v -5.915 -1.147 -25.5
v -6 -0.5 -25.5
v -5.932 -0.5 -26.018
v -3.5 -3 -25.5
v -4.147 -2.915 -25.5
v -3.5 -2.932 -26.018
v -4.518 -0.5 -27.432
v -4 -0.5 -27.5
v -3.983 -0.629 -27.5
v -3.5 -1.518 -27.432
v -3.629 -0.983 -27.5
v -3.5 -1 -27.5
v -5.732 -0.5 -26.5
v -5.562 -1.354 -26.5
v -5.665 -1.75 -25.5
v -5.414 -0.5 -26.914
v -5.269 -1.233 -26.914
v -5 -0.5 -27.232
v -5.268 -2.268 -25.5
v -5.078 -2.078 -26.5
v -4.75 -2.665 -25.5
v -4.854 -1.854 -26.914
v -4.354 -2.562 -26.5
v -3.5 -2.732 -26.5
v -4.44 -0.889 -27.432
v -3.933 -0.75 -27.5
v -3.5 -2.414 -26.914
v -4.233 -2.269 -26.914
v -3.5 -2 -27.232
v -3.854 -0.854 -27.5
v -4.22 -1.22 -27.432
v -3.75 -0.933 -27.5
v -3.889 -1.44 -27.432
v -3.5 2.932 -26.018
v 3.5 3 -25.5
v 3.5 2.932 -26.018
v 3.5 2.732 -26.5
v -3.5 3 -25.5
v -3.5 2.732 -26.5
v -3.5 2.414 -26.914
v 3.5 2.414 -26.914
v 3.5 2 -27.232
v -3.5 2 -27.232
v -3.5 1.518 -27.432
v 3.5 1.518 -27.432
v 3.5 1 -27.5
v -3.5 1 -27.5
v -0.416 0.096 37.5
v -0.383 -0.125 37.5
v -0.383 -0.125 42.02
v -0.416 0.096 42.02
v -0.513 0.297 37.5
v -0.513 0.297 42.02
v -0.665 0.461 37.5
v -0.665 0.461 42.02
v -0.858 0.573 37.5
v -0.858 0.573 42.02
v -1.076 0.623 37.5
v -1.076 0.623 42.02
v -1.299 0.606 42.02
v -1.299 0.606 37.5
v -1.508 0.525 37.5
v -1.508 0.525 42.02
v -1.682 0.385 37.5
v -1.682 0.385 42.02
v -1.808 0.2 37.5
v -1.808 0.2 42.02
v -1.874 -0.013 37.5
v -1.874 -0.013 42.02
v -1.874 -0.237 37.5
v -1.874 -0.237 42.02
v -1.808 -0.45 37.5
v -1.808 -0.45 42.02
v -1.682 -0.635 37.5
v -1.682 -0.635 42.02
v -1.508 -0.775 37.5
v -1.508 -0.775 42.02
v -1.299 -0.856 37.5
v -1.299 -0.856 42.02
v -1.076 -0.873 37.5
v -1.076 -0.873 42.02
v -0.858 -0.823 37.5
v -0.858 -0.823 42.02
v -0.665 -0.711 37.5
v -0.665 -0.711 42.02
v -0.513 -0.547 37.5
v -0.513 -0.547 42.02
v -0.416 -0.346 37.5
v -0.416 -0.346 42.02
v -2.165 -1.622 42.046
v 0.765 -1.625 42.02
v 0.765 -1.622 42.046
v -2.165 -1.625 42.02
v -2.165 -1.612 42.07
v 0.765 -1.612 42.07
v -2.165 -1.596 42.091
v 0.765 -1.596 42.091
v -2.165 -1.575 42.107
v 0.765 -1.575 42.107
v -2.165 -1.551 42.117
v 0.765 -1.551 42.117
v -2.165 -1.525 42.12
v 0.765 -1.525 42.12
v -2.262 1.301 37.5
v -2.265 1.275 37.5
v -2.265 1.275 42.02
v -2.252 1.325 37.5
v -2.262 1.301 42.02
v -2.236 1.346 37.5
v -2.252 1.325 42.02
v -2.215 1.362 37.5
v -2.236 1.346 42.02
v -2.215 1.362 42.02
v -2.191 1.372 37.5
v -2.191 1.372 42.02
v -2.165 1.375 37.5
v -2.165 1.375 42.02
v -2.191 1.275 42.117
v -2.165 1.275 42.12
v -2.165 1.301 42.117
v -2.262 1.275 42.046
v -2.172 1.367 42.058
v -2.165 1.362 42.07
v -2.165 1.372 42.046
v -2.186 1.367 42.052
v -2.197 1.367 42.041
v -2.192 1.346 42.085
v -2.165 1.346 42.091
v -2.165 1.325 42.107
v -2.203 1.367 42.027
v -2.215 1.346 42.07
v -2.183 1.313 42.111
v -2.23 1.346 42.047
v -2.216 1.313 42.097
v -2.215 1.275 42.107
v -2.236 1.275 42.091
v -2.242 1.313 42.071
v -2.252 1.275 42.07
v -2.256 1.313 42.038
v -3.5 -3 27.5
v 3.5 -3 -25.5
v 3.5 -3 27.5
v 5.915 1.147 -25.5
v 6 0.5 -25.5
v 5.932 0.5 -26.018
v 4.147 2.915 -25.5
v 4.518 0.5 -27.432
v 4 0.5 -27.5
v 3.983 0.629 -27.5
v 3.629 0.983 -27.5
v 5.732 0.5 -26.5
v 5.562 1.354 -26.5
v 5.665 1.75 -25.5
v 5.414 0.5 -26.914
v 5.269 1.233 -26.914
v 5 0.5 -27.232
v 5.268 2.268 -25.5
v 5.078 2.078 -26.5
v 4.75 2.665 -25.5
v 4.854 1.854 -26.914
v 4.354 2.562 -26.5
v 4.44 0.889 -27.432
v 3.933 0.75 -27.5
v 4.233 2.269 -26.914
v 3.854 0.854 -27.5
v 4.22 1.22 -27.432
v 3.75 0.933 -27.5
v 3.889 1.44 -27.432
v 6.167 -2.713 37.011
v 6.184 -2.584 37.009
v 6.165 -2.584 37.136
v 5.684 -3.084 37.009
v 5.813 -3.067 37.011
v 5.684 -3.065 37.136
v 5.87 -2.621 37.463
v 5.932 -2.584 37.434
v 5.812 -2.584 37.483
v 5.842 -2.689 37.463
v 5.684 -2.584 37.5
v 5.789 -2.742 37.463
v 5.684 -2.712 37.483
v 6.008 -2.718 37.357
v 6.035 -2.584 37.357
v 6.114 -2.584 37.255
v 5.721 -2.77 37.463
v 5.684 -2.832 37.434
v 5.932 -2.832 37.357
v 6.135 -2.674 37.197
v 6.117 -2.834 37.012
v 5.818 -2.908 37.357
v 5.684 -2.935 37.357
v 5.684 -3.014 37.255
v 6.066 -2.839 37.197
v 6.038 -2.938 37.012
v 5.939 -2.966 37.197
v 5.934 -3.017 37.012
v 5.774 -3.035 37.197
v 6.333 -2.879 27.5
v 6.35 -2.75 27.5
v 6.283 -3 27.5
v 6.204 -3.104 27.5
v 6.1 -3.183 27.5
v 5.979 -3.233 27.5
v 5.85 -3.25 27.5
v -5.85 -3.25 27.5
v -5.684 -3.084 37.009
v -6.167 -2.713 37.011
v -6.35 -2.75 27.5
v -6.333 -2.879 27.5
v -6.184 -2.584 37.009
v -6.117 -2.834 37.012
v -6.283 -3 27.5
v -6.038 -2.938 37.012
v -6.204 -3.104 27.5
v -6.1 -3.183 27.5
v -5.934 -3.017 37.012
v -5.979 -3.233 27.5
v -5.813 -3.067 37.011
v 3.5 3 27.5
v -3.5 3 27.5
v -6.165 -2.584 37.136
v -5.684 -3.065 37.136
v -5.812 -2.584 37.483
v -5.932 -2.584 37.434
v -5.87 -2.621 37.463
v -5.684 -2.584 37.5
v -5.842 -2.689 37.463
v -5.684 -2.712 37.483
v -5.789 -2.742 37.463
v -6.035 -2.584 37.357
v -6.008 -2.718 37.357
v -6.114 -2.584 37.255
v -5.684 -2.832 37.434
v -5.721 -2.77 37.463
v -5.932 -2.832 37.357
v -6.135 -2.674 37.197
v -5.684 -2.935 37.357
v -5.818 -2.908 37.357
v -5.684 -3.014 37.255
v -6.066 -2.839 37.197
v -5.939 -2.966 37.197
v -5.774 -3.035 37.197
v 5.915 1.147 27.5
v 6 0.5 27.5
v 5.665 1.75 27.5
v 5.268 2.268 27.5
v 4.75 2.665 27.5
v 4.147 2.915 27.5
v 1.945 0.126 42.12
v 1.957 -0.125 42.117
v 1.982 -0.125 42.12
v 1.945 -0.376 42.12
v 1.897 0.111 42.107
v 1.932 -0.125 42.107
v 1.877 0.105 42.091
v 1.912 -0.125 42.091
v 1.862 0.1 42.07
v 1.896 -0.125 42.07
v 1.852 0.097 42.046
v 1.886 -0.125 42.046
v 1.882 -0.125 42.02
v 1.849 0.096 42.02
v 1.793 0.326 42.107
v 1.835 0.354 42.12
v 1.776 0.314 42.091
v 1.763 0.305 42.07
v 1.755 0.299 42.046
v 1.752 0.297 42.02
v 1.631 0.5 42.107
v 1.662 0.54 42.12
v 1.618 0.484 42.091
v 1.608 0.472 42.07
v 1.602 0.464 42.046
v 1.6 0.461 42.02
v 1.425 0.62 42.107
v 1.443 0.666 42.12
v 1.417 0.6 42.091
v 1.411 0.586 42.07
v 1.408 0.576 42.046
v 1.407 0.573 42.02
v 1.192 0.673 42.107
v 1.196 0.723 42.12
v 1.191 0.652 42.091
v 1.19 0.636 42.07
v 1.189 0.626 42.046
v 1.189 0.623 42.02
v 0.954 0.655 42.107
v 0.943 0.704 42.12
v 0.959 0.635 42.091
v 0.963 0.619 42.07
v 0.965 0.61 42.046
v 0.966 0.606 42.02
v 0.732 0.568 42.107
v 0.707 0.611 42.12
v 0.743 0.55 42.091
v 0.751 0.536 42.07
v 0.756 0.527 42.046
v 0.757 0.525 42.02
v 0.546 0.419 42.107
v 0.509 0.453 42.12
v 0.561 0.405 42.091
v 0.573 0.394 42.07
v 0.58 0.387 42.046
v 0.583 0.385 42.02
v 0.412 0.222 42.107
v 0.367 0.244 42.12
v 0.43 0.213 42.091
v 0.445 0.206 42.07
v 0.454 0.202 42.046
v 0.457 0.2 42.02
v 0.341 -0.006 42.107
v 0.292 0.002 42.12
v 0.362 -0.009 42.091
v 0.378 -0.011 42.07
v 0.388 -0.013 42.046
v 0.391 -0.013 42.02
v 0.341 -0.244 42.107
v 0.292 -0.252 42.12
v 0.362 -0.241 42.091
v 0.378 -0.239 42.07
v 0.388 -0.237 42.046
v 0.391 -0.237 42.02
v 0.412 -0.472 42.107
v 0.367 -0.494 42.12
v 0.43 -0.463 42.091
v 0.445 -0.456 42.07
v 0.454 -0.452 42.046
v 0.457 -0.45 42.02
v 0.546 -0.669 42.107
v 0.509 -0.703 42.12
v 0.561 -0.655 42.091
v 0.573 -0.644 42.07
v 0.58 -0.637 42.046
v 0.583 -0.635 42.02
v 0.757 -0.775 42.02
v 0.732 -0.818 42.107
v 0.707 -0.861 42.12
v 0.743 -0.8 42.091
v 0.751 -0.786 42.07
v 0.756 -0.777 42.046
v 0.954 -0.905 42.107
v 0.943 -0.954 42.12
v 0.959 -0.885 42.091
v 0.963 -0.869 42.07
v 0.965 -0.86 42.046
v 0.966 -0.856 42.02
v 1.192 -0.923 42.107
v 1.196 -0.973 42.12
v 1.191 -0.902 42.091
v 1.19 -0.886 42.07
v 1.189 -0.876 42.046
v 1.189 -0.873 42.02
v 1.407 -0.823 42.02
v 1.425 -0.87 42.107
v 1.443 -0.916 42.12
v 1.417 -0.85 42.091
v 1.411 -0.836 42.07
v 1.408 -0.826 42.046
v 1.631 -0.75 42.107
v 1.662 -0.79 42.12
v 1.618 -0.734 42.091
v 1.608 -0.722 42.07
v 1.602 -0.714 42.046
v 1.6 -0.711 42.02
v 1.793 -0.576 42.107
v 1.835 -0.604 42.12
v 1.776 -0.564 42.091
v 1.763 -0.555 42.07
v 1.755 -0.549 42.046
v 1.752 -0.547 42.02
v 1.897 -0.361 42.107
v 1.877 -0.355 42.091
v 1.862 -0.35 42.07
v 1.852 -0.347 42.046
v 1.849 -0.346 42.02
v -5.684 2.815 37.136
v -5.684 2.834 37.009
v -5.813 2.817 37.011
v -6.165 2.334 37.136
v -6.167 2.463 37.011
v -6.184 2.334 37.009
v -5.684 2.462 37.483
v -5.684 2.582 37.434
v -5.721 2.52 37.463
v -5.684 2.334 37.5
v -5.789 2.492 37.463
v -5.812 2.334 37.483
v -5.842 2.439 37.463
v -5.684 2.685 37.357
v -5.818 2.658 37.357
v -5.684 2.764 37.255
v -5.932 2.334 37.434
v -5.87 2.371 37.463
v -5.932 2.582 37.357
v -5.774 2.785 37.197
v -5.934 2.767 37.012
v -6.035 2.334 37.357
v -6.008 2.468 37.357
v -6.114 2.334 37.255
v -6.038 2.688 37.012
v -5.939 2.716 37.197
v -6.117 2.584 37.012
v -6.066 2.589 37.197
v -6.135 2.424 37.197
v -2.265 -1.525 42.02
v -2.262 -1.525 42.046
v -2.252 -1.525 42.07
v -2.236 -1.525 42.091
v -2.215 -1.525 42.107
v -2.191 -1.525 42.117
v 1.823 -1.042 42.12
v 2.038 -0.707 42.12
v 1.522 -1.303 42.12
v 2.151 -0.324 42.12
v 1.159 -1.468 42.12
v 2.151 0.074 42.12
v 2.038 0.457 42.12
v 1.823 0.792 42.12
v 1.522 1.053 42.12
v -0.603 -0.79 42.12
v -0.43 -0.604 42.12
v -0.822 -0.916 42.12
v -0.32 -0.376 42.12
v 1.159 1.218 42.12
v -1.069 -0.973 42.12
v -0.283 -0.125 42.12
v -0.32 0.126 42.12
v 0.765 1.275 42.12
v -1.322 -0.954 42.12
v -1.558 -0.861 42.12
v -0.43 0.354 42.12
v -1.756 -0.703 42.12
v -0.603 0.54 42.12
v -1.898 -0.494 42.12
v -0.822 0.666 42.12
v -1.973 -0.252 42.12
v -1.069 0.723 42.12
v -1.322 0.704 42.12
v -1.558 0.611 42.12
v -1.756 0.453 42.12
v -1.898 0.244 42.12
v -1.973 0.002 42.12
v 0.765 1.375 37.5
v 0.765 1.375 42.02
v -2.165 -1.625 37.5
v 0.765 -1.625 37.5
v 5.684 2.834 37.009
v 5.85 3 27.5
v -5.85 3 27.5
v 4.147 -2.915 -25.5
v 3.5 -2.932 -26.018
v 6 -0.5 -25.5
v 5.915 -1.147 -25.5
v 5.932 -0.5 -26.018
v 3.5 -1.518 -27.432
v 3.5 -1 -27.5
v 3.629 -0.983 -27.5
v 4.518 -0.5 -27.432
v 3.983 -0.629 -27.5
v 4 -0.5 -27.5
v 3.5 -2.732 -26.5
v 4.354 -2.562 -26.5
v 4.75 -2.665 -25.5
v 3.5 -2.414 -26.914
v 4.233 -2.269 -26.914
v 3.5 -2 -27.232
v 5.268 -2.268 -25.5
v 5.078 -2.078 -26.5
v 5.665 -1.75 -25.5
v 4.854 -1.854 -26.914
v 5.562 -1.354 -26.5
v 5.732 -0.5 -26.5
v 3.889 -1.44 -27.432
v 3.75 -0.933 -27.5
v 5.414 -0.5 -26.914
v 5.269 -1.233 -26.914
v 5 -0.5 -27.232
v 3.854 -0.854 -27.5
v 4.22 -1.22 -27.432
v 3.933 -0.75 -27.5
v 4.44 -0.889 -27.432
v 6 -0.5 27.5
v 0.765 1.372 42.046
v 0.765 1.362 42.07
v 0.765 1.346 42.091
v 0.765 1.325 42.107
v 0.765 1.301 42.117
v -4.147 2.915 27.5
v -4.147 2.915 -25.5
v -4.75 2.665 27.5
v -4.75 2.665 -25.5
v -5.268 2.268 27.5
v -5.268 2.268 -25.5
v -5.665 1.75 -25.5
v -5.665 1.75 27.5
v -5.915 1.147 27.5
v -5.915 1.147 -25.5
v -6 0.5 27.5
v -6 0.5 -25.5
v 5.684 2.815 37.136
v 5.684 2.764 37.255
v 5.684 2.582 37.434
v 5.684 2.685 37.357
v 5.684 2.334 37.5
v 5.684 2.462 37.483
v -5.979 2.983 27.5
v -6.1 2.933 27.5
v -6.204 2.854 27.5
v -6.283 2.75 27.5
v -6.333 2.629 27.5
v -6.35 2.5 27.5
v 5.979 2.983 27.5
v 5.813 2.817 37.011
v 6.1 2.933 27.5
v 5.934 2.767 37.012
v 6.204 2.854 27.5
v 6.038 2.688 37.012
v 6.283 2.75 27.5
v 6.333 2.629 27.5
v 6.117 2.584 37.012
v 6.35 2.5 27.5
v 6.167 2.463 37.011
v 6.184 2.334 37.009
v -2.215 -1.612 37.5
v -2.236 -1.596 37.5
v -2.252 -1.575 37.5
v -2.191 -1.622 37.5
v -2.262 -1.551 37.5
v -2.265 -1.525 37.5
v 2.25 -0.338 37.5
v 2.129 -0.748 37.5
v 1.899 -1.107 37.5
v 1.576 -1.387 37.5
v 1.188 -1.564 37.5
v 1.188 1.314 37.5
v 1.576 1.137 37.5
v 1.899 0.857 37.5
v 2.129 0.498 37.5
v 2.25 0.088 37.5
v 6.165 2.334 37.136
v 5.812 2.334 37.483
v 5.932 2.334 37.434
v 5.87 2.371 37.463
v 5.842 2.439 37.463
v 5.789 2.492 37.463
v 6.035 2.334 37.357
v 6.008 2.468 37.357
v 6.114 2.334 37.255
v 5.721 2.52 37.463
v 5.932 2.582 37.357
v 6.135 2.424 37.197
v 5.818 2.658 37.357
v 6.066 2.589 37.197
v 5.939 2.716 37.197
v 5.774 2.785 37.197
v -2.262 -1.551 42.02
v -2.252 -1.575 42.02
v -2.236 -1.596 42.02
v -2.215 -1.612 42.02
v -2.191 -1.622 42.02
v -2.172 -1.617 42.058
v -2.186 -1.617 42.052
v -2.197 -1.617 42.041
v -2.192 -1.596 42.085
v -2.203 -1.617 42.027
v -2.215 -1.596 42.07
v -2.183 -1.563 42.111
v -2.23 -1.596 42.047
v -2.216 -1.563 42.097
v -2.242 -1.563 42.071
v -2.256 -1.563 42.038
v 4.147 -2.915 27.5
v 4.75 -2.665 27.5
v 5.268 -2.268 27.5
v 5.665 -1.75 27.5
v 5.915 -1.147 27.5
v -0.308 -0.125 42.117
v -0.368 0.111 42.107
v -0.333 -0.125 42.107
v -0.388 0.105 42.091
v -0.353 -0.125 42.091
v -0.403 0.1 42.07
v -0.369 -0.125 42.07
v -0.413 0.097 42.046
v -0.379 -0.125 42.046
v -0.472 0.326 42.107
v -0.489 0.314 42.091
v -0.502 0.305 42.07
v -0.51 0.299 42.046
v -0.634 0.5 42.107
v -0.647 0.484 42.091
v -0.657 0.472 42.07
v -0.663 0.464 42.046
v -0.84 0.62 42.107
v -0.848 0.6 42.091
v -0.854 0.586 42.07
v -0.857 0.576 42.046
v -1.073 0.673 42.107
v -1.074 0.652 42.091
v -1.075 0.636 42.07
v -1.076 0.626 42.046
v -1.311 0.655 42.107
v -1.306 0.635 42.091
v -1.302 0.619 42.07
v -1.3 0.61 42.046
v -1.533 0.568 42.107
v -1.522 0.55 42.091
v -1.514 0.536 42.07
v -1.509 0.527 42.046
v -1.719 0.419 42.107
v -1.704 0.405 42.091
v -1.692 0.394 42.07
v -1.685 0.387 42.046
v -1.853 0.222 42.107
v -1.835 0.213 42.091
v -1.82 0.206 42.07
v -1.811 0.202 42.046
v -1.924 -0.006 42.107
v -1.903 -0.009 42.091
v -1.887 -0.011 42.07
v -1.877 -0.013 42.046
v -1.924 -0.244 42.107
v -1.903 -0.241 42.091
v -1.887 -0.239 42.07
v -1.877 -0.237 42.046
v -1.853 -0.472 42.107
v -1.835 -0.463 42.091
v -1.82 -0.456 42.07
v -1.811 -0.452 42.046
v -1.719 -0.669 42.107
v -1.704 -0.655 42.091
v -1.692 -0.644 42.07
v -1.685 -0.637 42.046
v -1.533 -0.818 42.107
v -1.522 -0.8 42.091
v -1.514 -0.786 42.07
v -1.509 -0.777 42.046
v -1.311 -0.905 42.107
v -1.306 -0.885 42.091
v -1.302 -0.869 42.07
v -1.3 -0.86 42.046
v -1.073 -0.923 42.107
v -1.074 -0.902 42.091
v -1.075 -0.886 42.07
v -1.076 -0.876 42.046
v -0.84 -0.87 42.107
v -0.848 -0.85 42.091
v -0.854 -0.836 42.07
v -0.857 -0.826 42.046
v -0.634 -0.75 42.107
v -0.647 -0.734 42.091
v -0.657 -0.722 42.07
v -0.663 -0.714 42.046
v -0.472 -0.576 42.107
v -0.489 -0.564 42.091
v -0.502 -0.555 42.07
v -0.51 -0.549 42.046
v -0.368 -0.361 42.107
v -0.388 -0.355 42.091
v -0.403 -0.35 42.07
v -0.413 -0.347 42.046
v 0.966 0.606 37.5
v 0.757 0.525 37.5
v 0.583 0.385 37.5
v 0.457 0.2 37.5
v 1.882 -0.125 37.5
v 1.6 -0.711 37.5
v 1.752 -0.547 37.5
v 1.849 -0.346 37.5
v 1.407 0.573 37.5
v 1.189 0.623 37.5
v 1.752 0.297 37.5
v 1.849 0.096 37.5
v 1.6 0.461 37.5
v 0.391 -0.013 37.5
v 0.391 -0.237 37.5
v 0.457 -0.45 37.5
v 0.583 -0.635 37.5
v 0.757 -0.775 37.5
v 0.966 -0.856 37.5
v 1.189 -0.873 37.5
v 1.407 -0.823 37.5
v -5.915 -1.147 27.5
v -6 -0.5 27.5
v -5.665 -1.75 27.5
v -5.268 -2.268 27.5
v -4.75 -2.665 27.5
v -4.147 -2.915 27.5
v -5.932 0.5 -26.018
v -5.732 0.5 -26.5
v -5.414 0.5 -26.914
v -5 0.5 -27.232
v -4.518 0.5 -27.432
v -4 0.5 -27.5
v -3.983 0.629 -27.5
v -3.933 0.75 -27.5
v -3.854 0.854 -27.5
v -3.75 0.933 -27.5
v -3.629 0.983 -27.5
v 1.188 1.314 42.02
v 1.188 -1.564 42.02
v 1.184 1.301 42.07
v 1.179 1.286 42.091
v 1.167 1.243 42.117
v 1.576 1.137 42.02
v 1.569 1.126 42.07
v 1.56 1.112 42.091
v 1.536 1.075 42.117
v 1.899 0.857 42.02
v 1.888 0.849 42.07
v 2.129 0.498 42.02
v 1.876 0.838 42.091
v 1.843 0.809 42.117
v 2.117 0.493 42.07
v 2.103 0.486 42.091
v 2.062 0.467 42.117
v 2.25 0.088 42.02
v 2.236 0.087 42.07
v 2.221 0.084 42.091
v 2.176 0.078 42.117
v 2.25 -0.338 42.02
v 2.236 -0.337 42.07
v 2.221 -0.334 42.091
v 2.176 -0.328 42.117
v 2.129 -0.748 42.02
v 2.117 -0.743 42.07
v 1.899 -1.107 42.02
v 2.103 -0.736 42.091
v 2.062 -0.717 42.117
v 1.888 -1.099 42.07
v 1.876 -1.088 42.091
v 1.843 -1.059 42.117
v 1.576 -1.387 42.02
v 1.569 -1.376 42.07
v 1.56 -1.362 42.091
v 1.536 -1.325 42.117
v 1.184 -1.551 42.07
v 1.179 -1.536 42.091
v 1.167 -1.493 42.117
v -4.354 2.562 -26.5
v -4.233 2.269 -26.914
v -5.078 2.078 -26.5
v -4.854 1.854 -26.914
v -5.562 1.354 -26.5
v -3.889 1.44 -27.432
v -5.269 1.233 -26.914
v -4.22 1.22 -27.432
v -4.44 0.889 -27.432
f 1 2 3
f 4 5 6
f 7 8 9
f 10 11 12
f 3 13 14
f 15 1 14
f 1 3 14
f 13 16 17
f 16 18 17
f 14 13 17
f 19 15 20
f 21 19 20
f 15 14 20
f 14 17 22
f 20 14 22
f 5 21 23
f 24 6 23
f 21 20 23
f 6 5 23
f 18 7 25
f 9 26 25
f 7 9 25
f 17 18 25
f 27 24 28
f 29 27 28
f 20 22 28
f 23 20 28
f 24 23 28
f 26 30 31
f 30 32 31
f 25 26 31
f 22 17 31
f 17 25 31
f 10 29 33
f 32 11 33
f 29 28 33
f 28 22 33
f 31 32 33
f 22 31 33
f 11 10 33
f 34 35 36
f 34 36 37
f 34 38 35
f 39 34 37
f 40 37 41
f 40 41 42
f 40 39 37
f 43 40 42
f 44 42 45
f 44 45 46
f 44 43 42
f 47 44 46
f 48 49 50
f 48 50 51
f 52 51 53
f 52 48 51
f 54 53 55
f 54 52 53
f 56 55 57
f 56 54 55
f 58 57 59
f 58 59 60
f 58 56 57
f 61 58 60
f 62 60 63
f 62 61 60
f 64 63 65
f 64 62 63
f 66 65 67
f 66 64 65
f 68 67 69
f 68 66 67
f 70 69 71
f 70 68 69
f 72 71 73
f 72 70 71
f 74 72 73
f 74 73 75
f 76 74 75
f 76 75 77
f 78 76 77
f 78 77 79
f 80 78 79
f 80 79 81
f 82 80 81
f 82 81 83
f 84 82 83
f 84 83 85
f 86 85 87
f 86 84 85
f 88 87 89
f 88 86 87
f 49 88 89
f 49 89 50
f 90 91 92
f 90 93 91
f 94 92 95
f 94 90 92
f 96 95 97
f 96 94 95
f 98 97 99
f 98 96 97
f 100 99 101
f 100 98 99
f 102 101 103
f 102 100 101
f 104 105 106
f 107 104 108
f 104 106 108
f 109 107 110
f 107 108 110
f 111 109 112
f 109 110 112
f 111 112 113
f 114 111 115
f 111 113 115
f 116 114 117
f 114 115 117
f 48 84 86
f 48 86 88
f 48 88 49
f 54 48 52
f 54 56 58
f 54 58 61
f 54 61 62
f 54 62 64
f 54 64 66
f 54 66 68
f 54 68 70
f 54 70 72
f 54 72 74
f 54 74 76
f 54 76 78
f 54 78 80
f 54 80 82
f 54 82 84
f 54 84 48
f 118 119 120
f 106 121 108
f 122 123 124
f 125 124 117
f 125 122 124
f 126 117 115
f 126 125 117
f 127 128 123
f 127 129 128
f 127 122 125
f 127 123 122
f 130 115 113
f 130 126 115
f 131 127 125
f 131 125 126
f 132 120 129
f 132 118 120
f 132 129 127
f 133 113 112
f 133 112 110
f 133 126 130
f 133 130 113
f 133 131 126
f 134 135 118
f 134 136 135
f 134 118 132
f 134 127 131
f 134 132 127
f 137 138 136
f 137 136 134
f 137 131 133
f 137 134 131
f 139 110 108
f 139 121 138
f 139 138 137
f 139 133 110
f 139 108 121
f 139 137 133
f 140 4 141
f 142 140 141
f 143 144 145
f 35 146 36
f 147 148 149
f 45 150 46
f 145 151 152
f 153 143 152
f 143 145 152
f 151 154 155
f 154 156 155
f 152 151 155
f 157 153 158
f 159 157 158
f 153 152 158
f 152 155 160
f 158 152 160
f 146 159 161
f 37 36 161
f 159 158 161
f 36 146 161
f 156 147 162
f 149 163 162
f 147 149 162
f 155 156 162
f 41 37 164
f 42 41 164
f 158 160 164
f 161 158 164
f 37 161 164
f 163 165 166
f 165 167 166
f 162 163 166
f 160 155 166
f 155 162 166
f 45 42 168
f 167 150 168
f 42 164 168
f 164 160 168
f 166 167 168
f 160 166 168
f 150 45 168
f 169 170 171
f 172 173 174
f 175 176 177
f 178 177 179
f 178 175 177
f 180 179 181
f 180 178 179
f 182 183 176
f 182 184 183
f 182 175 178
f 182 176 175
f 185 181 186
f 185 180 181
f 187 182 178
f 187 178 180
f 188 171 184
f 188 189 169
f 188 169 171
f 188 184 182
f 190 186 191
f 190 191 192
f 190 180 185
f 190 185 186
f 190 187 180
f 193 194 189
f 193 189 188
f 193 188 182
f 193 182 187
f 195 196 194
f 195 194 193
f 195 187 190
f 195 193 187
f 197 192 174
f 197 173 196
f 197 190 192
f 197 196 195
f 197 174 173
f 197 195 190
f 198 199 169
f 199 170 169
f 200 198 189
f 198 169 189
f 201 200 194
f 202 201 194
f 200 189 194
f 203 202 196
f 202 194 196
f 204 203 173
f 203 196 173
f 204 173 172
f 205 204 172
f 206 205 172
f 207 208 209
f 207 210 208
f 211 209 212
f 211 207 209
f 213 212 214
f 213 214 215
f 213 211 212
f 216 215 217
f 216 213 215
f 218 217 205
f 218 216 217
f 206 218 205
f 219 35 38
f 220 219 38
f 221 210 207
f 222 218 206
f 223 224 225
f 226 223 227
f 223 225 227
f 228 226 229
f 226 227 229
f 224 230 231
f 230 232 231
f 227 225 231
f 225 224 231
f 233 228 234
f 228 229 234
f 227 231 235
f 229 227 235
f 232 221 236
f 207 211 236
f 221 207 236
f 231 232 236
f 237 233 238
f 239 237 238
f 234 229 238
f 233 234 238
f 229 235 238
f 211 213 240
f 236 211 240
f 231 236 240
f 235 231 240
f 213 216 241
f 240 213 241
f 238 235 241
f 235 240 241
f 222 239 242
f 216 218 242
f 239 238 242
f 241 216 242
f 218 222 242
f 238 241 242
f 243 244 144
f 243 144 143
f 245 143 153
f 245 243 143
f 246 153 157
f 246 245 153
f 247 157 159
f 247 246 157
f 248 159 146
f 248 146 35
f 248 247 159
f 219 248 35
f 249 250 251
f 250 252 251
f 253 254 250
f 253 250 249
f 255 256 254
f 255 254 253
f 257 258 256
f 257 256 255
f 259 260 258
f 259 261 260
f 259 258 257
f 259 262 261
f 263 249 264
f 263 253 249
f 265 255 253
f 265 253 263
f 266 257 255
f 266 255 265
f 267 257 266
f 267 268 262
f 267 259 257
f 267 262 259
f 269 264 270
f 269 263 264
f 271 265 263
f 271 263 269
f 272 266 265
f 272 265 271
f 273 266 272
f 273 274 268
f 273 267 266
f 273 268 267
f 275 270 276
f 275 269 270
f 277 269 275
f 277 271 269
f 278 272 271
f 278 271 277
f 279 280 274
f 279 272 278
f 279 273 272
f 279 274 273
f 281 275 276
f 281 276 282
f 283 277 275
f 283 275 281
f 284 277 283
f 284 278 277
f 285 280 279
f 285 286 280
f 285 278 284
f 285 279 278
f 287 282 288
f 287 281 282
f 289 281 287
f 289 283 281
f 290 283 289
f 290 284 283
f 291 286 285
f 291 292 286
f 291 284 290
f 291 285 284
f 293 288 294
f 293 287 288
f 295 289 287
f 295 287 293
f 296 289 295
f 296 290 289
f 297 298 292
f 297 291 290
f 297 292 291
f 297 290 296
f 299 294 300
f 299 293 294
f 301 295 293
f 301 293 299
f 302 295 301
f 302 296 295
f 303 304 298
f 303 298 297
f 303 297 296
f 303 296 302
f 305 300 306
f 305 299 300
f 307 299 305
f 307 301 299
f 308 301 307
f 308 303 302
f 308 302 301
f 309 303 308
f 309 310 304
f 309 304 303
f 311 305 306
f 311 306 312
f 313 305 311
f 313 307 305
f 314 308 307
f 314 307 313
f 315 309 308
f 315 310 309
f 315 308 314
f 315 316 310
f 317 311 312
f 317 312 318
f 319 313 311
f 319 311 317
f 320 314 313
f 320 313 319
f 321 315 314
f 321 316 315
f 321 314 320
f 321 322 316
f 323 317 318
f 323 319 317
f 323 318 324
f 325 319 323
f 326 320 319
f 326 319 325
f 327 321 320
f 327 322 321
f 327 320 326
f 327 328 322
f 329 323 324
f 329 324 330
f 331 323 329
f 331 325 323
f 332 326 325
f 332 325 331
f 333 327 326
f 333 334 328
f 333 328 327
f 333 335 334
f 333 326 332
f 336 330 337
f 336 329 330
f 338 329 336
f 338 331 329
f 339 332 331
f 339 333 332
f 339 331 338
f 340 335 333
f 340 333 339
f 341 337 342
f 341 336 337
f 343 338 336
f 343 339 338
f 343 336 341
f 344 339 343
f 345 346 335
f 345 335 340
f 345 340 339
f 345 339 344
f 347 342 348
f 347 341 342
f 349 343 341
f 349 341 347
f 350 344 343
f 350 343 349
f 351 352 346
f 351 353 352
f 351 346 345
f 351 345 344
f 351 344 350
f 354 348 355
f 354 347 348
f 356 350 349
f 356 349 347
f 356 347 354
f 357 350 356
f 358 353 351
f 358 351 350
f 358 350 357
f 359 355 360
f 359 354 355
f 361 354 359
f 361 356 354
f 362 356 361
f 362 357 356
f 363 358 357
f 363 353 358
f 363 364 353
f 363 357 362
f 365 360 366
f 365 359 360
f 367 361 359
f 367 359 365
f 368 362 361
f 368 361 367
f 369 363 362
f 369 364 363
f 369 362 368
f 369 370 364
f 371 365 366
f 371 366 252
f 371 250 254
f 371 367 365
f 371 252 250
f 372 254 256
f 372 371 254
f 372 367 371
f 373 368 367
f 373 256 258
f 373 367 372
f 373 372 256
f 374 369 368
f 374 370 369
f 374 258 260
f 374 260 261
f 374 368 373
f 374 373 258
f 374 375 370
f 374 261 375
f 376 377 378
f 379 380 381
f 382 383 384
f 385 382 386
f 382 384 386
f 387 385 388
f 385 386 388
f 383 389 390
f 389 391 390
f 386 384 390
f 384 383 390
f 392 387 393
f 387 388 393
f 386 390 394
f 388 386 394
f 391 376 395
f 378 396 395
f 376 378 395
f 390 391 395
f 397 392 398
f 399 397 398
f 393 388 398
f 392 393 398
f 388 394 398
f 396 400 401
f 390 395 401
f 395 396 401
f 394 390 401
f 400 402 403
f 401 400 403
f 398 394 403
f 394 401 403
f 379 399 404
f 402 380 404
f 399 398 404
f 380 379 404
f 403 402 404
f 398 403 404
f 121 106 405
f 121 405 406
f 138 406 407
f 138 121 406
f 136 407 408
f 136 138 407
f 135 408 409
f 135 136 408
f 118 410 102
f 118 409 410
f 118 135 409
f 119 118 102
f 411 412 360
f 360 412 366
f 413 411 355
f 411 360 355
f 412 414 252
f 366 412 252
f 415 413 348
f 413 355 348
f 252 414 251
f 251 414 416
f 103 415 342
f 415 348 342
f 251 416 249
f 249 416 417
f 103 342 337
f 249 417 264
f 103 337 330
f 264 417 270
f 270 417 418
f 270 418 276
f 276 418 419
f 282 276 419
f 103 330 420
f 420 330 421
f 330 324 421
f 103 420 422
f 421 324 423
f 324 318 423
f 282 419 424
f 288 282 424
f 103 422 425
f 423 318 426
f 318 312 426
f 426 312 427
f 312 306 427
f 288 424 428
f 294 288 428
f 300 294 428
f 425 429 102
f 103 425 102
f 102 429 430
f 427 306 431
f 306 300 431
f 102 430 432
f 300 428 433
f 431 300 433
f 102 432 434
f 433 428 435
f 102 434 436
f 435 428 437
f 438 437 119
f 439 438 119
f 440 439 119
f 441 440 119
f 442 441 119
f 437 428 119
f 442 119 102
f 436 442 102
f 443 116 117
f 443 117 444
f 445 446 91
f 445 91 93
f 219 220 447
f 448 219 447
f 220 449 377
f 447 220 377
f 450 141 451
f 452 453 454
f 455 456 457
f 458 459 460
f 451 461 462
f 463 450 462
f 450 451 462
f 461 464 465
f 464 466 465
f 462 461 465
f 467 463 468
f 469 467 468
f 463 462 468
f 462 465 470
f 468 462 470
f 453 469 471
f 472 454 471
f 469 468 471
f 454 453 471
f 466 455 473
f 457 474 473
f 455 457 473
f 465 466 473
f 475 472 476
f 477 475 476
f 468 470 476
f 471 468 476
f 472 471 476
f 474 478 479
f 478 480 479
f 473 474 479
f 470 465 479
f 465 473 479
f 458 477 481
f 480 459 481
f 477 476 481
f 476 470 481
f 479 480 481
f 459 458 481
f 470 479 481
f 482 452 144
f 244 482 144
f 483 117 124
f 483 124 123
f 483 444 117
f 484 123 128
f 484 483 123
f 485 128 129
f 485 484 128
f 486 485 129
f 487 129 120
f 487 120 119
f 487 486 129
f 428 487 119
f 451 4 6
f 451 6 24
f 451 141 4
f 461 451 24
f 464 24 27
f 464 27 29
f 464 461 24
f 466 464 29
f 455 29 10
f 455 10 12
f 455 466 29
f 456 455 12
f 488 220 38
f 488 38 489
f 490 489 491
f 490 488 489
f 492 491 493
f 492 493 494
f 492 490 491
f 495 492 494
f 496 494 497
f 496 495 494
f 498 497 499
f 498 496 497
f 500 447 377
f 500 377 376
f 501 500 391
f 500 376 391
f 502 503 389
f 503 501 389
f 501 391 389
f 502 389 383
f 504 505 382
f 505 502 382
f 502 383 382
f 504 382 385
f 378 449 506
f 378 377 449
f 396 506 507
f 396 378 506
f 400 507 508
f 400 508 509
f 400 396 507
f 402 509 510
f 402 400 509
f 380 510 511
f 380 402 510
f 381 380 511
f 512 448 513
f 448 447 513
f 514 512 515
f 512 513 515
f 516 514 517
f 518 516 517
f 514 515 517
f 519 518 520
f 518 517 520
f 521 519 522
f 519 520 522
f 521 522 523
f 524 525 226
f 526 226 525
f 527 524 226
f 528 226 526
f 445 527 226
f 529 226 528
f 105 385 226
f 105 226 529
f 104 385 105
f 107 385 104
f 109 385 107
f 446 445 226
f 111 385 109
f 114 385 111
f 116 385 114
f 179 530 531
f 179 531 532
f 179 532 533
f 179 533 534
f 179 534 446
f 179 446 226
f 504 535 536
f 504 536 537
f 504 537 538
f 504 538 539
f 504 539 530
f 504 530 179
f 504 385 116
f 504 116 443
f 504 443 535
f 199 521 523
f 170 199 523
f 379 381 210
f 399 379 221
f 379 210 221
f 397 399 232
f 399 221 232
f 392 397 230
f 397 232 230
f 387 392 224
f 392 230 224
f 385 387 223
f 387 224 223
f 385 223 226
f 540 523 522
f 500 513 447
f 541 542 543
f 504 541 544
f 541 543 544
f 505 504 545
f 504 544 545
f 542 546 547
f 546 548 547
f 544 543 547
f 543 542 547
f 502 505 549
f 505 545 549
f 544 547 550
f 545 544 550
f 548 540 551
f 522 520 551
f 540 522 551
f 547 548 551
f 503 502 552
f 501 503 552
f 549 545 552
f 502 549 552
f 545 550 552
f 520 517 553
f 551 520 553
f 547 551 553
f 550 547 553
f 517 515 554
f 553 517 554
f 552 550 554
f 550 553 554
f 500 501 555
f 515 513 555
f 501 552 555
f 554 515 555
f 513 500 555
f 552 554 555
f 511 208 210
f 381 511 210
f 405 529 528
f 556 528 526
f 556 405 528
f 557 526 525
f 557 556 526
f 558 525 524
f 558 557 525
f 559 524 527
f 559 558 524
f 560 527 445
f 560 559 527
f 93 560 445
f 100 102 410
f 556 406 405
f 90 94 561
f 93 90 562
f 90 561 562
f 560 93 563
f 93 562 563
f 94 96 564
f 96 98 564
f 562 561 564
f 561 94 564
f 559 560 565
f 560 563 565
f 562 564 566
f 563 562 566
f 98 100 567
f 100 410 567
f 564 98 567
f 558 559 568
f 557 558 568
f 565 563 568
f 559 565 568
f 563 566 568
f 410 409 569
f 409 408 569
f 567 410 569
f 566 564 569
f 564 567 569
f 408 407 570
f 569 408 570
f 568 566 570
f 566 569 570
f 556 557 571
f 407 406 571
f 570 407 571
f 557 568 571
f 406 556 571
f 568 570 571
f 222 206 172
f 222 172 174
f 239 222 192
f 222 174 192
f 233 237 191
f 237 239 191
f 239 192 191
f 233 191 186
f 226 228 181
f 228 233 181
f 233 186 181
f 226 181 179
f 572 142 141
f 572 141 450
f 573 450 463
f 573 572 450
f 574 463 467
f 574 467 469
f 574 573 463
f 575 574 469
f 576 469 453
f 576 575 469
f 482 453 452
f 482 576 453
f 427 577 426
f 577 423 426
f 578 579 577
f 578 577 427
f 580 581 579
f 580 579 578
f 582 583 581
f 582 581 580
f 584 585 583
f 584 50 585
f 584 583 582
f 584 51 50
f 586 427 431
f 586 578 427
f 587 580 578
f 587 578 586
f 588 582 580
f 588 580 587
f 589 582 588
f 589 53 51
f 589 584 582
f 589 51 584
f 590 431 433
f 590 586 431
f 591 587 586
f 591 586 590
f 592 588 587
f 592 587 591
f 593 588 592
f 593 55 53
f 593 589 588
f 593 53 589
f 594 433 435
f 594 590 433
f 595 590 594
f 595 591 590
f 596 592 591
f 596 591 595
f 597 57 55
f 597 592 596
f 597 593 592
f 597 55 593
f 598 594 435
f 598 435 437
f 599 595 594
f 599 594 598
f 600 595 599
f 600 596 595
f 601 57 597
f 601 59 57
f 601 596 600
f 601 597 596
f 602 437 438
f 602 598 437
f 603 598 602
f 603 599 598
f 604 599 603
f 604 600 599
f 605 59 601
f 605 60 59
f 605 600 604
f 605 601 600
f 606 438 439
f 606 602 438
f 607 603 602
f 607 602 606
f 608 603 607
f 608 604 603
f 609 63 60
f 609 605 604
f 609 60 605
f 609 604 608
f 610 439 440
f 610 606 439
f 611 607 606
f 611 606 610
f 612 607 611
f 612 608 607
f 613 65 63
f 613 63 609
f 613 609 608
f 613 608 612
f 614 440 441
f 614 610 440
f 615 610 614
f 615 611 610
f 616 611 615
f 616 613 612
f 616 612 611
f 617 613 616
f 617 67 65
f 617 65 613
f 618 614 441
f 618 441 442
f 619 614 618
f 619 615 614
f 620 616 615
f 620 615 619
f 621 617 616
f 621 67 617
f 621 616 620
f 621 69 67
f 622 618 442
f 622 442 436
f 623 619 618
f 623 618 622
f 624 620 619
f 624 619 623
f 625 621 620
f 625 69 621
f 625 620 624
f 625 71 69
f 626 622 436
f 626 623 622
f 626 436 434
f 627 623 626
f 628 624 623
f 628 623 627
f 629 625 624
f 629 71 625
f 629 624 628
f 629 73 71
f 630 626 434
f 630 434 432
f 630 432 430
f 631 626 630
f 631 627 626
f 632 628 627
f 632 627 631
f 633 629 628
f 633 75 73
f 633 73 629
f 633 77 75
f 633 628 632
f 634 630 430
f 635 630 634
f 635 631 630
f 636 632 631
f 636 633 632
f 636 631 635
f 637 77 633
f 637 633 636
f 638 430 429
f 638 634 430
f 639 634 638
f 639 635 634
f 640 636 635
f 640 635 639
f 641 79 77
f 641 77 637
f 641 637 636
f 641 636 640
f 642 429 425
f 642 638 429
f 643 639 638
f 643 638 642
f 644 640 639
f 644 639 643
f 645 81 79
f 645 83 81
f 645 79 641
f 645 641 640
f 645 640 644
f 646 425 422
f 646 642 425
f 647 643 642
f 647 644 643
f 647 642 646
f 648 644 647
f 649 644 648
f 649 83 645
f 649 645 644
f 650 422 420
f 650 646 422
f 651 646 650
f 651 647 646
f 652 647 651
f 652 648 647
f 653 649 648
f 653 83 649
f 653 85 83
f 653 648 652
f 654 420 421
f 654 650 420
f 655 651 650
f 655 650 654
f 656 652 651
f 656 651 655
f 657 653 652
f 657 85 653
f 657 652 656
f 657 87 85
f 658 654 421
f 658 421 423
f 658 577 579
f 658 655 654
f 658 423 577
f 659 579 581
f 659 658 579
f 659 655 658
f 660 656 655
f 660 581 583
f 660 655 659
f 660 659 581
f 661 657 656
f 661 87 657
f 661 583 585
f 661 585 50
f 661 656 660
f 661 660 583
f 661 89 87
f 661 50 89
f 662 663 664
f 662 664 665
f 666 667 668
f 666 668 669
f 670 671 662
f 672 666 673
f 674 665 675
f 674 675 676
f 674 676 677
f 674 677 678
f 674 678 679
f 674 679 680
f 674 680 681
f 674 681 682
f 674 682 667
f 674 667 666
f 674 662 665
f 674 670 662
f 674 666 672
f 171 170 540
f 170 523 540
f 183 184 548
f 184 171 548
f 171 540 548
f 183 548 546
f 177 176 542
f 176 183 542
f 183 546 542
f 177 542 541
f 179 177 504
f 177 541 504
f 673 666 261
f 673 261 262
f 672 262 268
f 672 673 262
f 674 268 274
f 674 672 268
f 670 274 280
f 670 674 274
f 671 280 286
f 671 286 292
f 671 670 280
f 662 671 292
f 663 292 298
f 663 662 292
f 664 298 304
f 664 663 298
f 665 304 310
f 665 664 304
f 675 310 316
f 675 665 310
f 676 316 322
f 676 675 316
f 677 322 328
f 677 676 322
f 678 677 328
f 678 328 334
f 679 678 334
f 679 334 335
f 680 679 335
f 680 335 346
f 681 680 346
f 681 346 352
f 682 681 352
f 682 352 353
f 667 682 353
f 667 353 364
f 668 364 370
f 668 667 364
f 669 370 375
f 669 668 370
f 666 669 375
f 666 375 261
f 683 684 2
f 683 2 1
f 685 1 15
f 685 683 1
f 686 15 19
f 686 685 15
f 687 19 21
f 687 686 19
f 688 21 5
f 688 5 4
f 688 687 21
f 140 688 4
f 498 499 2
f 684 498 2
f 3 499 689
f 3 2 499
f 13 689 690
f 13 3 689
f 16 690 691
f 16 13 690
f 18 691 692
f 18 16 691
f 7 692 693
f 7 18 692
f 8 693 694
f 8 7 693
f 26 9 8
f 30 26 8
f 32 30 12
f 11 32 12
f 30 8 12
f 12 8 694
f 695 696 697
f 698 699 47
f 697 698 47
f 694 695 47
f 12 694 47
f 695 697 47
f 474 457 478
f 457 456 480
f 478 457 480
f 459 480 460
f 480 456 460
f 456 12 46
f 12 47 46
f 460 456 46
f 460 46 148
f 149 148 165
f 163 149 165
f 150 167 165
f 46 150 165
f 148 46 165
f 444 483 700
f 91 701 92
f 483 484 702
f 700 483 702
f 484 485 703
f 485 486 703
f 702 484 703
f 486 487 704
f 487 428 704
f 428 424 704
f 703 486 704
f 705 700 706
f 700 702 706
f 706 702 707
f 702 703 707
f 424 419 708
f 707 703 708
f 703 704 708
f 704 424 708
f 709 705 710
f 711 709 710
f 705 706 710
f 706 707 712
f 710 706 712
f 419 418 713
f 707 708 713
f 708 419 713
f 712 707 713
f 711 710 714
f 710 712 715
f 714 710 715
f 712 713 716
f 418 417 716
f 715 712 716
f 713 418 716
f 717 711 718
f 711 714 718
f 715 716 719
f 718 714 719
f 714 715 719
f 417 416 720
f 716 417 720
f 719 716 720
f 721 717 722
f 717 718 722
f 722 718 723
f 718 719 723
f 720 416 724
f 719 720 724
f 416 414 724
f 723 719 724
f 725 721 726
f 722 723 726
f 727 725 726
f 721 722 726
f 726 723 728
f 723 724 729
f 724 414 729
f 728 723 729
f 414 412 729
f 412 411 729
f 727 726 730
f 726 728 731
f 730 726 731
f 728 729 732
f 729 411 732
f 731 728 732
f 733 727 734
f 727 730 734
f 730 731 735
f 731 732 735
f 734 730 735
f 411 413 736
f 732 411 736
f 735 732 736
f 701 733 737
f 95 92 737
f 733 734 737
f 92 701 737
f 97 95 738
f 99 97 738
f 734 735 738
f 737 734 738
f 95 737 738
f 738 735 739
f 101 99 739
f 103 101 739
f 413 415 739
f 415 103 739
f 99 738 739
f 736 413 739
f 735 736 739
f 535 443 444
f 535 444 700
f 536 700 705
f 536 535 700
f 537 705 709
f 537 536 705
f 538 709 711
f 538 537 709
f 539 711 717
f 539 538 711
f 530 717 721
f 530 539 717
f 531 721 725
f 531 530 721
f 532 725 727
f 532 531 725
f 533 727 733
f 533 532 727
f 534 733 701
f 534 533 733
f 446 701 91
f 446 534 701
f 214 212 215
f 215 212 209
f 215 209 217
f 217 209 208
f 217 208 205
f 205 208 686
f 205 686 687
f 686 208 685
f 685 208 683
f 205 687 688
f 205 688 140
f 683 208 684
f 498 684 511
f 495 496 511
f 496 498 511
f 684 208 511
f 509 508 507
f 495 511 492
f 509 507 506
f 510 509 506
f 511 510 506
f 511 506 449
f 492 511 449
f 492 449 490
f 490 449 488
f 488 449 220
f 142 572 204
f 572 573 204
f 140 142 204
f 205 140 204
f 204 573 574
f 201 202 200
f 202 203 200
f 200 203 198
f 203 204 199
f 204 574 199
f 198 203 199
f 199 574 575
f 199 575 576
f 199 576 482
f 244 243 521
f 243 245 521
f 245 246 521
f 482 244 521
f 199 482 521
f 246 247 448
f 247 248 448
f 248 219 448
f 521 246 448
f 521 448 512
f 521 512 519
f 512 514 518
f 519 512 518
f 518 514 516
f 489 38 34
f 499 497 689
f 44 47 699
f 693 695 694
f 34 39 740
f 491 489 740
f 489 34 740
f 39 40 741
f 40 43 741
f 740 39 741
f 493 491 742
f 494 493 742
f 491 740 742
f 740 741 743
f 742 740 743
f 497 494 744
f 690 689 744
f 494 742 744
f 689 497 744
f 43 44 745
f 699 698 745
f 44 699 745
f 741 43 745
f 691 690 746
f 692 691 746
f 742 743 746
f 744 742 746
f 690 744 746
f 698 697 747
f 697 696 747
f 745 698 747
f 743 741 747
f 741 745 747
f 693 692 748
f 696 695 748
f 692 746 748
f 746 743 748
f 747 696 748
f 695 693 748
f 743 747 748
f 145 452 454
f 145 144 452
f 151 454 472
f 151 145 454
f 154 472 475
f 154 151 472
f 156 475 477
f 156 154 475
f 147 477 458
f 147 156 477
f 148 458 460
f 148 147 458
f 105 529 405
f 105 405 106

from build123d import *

# Parameters (mm, degrees)
BOSS_EXTRUDE1_DEPTH = 27.5
SKETCH2_W           = 12.7
SKETCH2_H           = 6.25
BOSS_EXTRUDE2_DEPTH = 10
BOSS_EXTRUDE2_TAPER = 1
FILLET2_R           = 2
SKETCH4_R           = 0.75
BOSS_EXTRUDE4_DEPTH = 4.62
FILLET3_R           = 0.5
FILLET4_R           = 0.1


with BuildPart() as part:
    # Sketch1 → Boss-Extrude1 (new body, symmetric)
    with BuildSketch(Plane.XY):
        with BuildLine():
            Line((-3.5, -3), (3.5, -3))
            ThreePointArc((3.5, -3), (5.267766953, -2.267766953), (6, -0.5))
            Line((6, -0.5), (6, 0.5))
            ThreePointArc((6, 0.5), (5.267766953, 2.267766953), (3.5, 3))
            Line((3.5, 3), (-3.5, 3))
            ThreePointArc((-3.5, 3), (-5.267766953, 2.267766953), (-6, 0.5))
            Line((-6, 0.5), (-6, -0.5))
            ThreePointArc((-6, -0.5), (-5.267766953, -2.267766953), (-3.5, -3))
        make_face()
    extrude(amount=BOSS_EXTRUDE1_DEPTH, both=True)

    # Sketch2 → Boss-Extrude2 (add)
    with BuildSketch(Plane.XY.offset(27.5)):
        with Locations((0, -0.125)):
            Rectangle(SKETCH2_W, SKETCH2_H)
    extrude(amount=BOSS_EXTRUDE2_DEPTH, taper=BOSS_EXTRUDE2_TAPER)

    # Fillet2
    fillet2_edges = [part.edges().sort_by_distance(p)[0] for p in [
        (6, 0, -27.5),
        (5.267766953, -2.267766953, -27.5),
        (0, -3, -27.5),
        (-5.267766953, -2.267766953, -27.5),
        (-6, 0, -27.5),
        (-5.267766953, 2.267766953, -27.5),
        (0, 3, -27.5),
        (5.267766953, 2.267766953, -27.5),
    ]]
    fillet(fillet2_edges, radius=FILLET2_R)

    # Sketch4 → Boss-Extrude4 (add)
    with BuildSketch(Plane.XY.offset(37.5)):
        with BuildLine():
            Line((-2.265, 1.375), (0.765, 1.375))
            ThreePointArc((0.765, 1.375), (2.265, -0.125), (0.765, -1.625))
            Line((0.765, -1.625), (-2.265, -1.625))
            Line((-2.265, -1.625), (-2.265, 1.375))
        make_face()
        with Locations((-1.1325, -0.125)):
            Circle(SKETCH4_R, mode=Mode.SUBTRACT)
        with Locations((1.1325, -0.125)):
            Circle(SKETCH4_R, mode=Mode.SUBTRACT)
    extrude(amount=BOSS_EXTRUDE4_DEPTH)

    # Fillet3
    fillet3_edges = [part.edges().sort_by_distance(p)[0] for p in [
        (6.262724675, -3.162724675, 32.5),
        (6.262724675, 2.912724675, 32.5),
        (-6.262724675, 2.912724675, 32.5),
        (-6.262724213, -3.162724213, 32.500026465),
        (6.175449351, -0.125, 37.5),
        (0, 2.825449351, 37.5),
        (-6.175449351, -0.125, 37.5),
        (0, -3.075449351, 37.5),
    ]]
    fillet(fillet3_edges, radius=FILLET3_R)

    # Fillet4
    fillet4_edges = [part.edges().sort_by_distance(p)[0] for p in [
        (-2.265, -0.125, 42.12),
        (-0.75, -1.625, 42.12),
        (2.265, -0.125, 42.12),
        (-0.75, 1.375, 42.12),
        (-2.265, 1.375, 39.81),
        (-2.265, -1.625, 39.81),
        (-1.8825, -0.125, 42.12),
        (0.3825, -0.125, 42.12),
    ]]
    fillet(fillet4_edges, radius=FILLET4_R)


solid = part.part
